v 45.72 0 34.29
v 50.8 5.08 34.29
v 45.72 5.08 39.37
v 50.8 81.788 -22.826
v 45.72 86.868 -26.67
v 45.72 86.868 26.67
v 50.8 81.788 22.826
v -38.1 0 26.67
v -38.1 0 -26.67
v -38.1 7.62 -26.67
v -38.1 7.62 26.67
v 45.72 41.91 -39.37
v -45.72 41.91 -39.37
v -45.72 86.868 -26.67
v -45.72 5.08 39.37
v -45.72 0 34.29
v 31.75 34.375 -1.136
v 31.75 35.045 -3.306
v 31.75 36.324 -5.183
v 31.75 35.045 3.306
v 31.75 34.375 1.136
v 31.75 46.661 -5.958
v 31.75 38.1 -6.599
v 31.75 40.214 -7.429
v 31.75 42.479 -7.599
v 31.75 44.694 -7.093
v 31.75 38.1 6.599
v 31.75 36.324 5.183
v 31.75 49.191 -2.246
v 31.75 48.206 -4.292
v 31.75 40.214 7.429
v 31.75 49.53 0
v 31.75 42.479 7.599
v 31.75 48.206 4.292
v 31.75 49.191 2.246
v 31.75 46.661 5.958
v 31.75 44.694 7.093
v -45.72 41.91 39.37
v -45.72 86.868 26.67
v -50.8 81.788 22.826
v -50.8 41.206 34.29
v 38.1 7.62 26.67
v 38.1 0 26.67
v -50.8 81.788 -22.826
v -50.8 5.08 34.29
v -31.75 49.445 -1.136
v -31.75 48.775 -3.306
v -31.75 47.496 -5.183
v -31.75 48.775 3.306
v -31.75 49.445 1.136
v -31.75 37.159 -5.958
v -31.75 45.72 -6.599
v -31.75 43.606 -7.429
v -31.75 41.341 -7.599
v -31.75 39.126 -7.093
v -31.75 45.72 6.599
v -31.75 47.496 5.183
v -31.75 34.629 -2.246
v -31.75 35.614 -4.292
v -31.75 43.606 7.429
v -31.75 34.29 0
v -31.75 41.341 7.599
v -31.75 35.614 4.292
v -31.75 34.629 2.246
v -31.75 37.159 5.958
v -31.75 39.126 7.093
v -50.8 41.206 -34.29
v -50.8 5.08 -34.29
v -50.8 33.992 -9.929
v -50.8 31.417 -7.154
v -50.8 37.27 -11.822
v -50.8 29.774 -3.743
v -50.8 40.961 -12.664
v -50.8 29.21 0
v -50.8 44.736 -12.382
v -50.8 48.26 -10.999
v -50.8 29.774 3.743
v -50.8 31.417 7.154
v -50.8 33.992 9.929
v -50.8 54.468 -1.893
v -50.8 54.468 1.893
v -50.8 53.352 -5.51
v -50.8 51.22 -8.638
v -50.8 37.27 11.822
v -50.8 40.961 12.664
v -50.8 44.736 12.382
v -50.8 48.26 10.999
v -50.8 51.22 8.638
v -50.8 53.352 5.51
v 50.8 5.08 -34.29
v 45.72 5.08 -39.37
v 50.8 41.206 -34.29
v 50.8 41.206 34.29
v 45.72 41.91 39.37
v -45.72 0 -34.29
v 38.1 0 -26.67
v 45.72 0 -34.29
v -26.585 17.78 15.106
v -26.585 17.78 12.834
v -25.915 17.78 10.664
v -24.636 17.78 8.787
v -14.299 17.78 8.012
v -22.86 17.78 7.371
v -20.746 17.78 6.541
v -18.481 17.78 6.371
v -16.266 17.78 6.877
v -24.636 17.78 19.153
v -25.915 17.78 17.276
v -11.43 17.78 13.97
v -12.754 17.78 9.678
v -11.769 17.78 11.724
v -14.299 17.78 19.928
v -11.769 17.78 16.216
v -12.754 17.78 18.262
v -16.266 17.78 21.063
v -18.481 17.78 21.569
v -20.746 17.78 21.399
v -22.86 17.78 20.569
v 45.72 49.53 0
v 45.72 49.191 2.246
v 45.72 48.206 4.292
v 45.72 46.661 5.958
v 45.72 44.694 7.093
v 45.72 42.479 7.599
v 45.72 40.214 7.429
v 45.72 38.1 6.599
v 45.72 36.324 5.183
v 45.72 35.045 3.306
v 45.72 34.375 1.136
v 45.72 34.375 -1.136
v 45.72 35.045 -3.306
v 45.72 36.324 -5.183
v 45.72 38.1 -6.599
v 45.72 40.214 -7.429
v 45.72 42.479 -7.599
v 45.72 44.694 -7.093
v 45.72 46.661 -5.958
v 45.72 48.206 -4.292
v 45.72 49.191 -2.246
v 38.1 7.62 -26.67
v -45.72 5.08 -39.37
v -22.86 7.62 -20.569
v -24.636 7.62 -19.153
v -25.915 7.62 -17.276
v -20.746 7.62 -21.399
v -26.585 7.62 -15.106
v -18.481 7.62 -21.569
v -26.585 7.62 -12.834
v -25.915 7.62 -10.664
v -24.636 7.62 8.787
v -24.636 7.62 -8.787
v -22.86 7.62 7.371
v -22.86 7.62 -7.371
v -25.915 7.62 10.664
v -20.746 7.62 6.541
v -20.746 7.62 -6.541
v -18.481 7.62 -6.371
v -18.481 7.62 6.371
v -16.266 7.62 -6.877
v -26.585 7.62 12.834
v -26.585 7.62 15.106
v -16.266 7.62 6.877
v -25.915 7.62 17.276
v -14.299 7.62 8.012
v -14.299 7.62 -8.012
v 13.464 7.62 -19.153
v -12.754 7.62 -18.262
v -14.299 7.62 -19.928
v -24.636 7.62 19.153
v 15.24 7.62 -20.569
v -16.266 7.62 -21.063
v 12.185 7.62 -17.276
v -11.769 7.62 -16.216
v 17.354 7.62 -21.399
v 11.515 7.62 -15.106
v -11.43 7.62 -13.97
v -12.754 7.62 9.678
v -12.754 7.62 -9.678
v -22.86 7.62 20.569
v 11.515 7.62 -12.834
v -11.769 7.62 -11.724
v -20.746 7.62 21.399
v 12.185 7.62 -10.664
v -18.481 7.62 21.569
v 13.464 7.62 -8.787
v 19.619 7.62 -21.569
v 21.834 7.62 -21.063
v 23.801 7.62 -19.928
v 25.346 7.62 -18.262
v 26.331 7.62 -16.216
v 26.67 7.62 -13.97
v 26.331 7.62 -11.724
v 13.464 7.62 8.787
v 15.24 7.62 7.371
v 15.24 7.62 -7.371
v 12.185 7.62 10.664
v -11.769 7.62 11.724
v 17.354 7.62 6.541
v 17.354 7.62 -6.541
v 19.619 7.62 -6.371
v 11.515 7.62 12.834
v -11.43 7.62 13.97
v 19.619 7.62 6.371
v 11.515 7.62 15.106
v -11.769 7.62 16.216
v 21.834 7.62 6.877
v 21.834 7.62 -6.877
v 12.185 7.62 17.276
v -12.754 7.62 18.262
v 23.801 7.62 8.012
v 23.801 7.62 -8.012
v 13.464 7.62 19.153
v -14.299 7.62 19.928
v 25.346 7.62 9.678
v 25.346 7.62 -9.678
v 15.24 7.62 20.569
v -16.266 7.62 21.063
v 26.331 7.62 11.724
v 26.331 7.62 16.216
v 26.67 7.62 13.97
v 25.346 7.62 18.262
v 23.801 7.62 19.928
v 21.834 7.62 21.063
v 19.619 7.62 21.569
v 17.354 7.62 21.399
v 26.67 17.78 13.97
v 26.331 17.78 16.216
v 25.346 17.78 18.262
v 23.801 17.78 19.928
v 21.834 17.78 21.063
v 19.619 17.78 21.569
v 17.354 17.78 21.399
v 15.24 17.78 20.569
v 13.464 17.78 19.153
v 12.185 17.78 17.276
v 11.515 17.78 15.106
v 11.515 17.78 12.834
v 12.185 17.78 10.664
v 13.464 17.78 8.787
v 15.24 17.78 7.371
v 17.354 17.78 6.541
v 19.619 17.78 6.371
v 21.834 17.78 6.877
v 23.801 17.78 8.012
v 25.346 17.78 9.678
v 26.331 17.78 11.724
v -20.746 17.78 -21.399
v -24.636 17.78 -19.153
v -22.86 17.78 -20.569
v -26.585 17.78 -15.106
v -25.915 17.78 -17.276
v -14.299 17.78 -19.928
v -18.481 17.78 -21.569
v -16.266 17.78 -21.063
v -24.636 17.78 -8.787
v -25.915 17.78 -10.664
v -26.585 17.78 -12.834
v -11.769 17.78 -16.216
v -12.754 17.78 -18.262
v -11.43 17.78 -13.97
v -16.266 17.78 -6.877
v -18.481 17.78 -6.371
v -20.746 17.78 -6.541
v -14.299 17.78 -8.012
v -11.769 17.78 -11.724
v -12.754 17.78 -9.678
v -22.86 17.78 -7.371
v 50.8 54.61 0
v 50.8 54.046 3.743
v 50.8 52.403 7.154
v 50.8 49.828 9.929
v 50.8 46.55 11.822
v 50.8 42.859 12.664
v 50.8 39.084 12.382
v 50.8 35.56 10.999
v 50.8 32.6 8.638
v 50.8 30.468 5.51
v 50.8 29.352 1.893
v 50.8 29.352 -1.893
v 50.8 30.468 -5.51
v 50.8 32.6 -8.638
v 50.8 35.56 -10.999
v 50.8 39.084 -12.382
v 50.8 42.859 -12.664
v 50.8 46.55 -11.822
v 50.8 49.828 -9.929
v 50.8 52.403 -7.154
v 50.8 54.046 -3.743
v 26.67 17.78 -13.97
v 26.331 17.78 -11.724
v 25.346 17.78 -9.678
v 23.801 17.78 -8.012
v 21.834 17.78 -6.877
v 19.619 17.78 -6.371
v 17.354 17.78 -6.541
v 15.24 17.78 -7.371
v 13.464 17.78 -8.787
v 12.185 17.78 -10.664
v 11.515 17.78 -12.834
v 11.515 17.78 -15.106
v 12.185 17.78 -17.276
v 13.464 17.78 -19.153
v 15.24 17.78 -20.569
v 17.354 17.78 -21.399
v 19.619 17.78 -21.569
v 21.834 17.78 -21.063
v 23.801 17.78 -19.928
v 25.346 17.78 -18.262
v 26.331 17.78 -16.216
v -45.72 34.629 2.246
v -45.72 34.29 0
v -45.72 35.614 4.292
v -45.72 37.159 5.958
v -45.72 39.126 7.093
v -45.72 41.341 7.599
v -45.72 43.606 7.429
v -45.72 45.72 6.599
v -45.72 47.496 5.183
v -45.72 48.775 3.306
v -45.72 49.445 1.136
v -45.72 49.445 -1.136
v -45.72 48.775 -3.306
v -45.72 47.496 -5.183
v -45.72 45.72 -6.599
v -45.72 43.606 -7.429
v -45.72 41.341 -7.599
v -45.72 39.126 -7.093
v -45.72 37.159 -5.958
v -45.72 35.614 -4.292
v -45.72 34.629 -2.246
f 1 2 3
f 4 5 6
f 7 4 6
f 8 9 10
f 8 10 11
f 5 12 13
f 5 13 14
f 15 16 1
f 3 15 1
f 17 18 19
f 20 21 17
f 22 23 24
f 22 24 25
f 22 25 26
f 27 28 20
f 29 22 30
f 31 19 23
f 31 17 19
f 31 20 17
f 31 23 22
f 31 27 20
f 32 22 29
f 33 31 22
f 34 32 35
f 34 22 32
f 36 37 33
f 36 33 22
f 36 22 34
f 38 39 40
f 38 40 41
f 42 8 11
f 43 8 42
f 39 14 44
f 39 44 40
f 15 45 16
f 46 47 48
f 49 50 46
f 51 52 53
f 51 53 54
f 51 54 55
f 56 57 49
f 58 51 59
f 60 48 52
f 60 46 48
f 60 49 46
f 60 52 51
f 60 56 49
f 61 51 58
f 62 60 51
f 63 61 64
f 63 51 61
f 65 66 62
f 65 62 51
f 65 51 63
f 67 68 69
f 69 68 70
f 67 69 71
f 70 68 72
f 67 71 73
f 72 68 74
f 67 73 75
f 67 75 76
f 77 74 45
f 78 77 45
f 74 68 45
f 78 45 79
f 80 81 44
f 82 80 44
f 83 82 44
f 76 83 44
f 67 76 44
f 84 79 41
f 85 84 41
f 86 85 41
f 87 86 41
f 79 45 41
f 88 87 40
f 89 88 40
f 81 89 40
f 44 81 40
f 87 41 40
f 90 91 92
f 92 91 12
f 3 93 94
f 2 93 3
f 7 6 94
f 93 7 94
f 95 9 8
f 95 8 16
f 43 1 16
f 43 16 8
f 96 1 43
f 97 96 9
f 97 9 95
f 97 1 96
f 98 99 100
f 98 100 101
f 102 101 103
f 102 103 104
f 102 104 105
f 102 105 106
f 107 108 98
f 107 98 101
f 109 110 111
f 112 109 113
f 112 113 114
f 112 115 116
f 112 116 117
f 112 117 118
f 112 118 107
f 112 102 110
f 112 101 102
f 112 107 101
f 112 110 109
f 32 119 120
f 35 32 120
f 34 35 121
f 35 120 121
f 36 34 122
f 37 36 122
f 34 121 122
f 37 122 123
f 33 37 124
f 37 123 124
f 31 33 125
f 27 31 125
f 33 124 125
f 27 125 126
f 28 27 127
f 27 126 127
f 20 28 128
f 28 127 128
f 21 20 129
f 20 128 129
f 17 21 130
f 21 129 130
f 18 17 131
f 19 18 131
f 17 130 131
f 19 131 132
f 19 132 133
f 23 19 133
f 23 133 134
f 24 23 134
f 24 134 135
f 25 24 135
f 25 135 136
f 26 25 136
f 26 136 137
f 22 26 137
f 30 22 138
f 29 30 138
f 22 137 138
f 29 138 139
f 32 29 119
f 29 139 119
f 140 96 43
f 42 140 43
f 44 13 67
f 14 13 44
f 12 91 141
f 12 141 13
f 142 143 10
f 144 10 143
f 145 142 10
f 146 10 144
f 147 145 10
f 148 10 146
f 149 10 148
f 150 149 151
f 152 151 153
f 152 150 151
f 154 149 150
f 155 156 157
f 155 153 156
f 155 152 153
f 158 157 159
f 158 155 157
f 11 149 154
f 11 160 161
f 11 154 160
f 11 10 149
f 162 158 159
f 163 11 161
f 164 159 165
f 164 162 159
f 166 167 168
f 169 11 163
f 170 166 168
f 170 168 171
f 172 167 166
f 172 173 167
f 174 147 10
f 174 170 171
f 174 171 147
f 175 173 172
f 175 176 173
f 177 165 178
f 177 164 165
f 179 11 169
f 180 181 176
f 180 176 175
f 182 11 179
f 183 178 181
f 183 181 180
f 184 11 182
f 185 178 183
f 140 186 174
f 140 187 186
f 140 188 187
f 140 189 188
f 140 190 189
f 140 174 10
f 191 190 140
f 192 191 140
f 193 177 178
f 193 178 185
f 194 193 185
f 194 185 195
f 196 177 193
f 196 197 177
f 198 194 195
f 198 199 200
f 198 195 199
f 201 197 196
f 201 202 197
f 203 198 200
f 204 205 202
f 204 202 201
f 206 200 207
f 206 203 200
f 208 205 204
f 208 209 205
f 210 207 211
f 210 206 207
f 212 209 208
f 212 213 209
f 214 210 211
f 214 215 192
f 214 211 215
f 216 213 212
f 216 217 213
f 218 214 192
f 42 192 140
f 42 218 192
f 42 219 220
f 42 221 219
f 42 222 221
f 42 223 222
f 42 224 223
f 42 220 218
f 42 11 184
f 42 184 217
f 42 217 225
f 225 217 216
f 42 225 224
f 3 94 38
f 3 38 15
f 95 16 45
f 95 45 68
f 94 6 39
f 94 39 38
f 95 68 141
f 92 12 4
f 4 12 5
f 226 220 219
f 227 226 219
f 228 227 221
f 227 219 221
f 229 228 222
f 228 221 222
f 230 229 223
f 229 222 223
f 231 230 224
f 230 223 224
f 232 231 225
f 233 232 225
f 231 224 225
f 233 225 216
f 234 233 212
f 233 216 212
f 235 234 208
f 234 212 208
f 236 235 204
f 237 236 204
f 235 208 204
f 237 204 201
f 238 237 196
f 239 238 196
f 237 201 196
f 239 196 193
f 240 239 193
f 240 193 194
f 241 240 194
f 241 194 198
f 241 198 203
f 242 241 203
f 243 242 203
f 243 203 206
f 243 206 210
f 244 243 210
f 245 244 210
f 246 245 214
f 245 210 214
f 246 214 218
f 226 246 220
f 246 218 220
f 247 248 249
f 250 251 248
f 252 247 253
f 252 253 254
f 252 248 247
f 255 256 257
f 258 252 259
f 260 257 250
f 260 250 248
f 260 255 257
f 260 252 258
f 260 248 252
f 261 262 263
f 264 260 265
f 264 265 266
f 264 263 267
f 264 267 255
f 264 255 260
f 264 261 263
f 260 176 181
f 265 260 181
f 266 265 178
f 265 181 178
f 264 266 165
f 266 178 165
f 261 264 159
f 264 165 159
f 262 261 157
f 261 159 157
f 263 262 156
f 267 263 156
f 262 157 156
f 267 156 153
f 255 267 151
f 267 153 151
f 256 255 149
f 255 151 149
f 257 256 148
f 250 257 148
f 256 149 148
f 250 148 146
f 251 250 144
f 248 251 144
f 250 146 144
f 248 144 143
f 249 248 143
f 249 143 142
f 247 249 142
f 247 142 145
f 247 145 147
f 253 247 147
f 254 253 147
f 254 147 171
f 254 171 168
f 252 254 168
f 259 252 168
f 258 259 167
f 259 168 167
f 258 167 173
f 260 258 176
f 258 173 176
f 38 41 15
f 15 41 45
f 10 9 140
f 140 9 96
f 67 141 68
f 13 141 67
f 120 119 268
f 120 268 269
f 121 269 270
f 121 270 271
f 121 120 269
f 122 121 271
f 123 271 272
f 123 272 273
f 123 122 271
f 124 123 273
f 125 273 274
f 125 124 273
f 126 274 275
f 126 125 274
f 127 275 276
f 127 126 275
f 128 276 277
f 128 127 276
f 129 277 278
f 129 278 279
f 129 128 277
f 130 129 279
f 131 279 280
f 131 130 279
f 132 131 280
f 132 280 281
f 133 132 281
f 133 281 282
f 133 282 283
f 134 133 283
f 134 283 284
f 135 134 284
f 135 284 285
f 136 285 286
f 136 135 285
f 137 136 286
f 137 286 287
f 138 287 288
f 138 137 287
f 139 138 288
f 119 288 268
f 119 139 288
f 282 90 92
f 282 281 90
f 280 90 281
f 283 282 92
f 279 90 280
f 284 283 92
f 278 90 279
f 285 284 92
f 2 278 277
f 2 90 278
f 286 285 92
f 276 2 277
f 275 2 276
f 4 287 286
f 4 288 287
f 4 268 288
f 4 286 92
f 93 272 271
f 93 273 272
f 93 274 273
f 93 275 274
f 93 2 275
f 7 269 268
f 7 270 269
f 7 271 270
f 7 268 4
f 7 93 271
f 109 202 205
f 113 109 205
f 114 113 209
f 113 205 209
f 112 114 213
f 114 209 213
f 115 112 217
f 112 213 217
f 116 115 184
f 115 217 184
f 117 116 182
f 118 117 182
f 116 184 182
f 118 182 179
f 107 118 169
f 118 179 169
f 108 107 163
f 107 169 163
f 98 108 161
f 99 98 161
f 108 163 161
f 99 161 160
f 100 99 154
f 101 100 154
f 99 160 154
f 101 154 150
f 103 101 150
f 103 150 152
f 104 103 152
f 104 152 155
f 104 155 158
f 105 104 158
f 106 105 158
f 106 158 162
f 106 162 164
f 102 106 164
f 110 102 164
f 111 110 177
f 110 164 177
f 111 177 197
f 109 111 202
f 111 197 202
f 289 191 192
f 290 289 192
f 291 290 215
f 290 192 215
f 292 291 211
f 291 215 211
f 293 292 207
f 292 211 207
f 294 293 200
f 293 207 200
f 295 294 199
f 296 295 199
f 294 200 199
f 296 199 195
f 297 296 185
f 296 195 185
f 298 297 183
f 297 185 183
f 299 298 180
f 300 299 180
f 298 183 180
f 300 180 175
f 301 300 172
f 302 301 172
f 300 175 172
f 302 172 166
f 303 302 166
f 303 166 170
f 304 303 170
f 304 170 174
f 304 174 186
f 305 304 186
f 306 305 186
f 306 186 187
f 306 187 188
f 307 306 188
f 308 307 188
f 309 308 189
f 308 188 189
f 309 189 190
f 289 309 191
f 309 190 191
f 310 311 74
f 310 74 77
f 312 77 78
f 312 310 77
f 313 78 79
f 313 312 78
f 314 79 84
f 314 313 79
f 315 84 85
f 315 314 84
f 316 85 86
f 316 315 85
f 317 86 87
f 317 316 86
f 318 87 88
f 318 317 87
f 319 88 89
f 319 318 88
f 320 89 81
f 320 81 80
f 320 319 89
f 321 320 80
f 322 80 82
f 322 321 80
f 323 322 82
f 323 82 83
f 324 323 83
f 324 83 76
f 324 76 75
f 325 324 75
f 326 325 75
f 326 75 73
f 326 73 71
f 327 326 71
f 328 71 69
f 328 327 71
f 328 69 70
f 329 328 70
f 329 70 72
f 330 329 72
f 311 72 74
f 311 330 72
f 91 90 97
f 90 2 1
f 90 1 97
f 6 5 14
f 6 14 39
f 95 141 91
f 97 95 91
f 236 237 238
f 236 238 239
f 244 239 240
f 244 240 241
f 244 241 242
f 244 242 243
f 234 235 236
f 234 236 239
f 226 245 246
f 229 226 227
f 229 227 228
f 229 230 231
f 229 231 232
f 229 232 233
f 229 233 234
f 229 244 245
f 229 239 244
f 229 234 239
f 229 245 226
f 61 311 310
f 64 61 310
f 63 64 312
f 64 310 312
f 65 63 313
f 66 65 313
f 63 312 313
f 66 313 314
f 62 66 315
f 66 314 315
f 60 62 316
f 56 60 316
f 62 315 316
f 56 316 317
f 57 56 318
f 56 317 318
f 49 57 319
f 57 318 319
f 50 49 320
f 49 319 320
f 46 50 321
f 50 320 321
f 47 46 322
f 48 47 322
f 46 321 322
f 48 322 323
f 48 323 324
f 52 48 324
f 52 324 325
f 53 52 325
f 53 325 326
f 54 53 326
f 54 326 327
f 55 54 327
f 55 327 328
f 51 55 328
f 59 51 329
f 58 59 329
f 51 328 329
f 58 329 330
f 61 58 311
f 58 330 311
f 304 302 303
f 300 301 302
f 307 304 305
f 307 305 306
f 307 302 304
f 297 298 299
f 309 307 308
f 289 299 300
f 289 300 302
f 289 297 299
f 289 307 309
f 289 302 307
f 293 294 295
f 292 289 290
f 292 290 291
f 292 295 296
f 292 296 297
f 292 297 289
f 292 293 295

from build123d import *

# Parameters (mm, degrees)
F1_DEPTH = 50.8
F2_W     = 76.2
F2_H     = 53.34
F3_DEPTH = 7.62
F4_R     = 7.62
F5_DEPTH = 10.16
F6_R     = 7.62
F7_DEPTH = 19.05
F8_R     = 7.62
F9_DEPTH = 19.05
F10_SIZE = 5.08


with BuildPart() as f1:
    # F0 (on Right) → F1 (new body, symmetric)
    with BuildSketch(Plane.YZ):
        Polygon((41.91, 39.37), (0, 39.37), (0, 0), (0, -39.37), (41.91, -39.37), (86.868, -26.67), (86.868, 0), (86.868, 26.67), align=None)
    extrude(amount=F1_DEPTH, both=True)

    # F2 (on face) → F3 (cut)
    with BuildSketch(Plane.XZ):
        Rectangle(F2_W, F2_H)
    extrude(amount=-F3_DEPTH, mode=Mode.SUBTRACT)

    # F4 (on face) → F5 (cut)
    with BuildSketch(Plane.XZ.offset(-7.62)):
        with Locations((-19.05, 13.97)):
            Circle(F4_R)
        with Locations((19.05, 13.97)):
            Circle(F4_R)
        with Locations((-19.05, -13.97)):
            Circle(F4_R)
        with Locations((19.05, -13.97)):
            Circle(F4_R)
    extrude(amount=-F5_DEPTH, mode=Mode.SUBTRACT)

    # F6 (on face) → F7 (cut)
    with BuildSketch(Plane.YZ.offset(50.8)):
        with Locations((41.91, 0)):
            Circle(F6_R)
    extrude(amount=-F7_DEPTH, mode=Mode.SUBTRACT)

    # F8 (on face) → F9 (cut)
    with BuildSketch(Plane(origin=(-50.8, 0, 0), x_dir=(0, -1, 0), z_dir=(-1, 0, 0))):
        with Locations((-41.91, 0)):
            Circle(F8_R)
    extrude(amount=-F9_DEPTH, mode=Mode.SUBTRACT)

    # F10
    f10_edges = [f1.edges().sort_by_distance(p)[0] for p in [
        (50.8, 20.955, 39.37),
        (50.8, 64.389, 33.02),
        (50.8, 0, 0),
        (50.8, 86.868, 0),
        (50.8, 20.955, -39.37),
        (50.8, 64.389, -33.02),
        (50.8, 34.29, 0),
        (-50.8, 20.955, 39.37),
        (-50.8, 64.389, 33.02),
        (-50.8, 0, 0),
        (-50.8, 86.868, 0),
        (-50.8, 20.955, -39.37),
        (-50.8, 64.389, -33.02),
        (-50.8, 49.53, 0),
        (0, 0, 39.37),
        (0, 0, -39.37),
    ]]
    chamfer(f10_edges, length=F10_SIZE)


solid = f1.part
